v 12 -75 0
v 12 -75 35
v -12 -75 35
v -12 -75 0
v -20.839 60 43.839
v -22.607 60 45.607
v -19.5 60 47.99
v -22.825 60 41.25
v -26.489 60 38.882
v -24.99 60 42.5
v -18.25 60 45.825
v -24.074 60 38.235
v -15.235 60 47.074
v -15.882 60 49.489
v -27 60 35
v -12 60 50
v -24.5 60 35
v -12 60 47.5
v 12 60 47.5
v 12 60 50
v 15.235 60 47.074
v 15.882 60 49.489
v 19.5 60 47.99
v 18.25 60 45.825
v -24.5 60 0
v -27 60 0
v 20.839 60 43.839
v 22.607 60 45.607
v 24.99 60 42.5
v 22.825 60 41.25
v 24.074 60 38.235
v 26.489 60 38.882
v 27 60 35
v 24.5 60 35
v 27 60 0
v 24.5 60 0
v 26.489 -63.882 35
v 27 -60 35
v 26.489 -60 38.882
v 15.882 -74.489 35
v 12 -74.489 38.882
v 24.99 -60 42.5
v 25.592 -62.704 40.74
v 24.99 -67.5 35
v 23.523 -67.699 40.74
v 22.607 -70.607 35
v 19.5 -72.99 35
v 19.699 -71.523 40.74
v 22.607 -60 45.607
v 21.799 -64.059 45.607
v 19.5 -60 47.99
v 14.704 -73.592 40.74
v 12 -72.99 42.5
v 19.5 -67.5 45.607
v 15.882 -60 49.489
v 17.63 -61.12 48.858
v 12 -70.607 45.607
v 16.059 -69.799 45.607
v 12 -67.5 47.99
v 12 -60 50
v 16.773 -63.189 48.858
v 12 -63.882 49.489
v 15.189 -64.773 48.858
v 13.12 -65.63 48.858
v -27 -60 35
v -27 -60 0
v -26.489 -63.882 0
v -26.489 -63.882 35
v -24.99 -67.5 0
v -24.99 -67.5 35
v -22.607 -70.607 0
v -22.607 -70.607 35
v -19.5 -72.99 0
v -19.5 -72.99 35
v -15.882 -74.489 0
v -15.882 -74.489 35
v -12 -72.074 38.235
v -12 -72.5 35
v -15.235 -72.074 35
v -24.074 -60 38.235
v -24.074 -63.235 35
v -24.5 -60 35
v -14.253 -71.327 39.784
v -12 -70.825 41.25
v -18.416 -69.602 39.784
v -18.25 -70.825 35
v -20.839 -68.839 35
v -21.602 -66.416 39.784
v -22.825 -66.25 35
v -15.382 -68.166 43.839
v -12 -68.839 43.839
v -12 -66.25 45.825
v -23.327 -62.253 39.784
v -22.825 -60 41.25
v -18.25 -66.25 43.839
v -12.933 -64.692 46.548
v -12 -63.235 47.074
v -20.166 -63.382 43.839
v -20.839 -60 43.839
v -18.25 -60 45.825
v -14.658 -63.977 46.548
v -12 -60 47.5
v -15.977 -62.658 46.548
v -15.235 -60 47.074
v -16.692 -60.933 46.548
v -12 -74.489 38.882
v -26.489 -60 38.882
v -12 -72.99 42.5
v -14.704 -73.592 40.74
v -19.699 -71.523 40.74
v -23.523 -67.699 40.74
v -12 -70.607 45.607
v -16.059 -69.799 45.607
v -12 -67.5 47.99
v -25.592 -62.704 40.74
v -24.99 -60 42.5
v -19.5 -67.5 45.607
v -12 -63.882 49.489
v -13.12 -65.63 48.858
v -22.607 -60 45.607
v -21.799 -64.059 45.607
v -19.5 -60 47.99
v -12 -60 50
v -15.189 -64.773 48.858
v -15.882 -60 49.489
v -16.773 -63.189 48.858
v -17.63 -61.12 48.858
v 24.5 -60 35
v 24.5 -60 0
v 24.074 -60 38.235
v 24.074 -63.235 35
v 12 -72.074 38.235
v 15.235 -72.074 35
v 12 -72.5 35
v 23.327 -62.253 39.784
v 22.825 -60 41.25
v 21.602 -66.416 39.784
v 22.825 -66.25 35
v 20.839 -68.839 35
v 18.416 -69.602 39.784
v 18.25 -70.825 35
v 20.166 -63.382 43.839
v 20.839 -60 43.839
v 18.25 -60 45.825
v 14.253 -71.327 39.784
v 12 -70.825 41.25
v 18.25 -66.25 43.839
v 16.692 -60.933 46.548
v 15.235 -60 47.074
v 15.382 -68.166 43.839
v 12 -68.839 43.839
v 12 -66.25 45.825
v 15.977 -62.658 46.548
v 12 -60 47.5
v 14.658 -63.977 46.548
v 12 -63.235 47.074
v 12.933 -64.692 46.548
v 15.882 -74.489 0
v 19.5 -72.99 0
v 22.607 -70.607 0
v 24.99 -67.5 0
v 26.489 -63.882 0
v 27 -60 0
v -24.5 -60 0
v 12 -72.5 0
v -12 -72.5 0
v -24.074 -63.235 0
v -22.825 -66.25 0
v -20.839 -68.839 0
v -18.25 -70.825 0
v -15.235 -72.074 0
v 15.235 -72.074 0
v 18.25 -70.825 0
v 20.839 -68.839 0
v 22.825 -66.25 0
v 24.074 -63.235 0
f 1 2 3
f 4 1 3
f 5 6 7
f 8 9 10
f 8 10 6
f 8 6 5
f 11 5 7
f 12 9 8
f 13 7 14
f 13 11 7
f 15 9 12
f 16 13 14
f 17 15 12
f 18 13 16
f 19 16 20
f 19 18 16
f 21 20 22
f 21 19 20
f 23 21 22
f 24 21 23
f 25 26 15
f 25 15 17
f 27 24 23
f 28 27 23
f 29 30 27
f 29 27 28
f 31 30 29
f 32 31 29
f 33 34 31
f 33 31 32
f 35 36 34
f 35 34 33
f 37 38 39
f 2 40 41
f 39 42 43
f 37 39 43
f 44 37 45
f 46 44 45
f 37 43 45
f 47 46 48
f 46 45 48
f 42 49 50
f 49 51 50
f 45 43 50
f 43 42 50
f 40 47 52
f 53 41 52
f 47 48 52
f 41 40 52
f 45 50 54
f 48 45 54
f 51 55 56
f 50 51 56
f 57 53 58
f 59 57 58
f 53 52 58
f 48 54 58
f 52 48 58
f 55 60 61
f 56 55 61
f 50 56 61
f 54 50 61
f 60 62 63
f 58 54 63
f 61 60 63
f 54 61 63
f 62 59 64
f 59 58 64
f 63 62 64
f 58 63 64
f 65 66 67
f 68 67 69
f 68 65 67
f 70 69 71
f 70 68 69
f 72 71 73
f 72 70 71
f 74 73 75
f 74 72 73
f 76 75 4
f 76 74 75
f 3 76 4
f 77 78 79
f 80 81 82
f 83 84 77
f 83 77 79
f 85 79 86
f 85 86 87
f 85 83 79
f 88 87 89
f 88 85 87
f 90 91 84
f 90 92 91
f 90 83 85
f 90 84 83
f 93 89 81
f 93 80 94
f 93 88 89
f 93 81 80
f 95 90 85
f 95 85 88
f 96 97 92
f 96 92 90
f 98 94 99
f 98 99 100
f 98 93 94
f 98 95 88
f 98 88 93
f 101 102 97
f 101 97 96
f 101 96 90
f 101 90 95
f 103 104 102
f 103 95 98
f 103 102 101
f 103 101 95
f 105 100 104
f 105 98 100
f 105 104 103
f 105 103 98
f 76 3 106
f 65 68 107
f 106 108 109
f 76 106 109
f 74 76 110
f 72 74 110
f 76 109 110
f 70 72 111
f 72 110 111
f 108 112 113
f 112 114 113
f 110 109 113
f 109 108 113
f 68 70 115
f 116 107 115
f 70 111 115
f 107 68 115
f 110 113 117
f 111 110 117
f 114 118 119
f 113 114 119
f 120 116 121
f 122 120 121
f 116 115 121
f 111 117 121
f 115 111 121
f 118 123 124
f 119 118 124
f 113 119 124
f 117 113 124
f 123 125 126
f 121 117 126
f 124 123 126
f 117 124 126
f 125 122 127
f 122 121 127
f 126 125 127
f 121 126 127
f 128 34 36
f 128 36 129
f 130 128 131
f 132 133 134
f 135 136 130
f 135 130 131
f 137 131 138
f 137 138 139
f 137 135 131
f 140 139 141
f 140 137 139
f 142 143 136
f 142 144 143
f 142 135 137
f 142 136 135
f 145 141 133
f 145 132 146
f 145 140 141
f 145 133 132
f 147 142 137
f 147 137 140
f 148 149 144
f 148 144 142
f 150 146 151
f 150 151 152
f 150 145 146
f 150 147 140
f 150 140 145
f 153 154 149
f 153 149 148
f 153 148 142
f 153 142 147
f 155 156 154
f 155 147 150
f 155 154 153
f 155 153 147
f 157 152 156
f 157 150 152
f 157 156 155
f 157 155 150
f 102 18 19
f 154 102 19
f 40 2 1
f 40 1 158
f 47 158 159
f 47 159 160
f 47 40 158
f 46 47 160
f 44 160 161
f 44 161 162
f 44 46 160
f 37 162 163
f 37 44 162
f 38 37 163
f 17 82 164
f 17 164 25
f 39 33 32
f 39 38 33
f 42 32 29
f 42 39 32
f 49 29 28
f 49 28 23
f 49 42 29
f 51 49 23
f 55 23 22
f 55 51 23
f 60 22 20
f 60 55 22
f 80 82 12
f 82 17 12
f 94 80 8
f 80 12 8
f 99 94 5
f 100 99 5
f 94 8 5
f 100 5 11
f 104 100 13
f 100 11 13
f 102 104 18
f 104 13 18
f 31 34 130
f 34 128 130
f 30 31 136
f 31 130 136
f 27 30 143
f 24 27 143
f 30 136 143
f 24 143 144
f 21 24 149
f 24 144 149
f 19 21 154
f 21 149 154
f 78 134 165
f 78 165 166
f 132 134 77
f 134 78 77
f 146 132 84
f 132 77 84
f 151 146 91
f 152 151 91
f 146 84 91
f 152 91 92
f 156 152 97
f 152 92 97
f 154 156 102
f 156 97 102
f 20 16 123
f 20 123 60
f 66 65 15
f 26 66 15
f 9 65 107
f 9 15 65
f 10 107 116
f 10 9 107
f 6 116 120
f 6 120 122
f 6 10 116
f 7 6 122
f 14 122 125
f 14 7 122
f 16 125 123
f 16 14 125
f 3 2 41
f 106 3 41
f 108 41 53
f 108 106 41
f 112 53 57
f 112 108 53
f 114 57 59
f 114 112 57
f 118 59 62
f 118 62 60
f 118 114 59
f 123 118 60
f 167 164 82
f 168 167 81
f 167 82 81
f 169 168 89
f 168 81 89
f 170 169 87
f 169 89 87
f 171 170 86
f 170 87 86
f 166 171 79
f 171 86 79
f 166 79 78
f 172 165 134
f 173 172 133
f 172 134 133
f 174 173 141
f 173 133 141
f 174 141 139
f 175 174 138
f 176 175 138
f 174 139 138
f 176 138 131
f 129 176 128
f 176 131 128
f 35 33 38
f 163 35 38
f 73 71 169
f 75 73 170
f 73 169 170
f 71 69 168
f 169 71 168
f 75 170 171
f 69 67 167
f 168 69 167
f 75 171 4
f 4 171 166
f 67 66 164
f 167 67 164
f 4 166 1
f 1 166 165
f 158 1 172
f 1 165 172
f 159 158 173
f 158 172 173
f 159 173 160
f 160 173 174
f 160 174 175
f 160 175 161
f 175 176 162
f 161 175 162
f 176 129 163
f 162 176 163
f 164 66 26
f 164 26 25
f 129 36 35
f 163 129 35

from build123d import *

# Parameters (mm, degrees)
F0_W     = 54
F0_H     = 150
F1_DEPTH = 50
F2_R     = 15
F3_R     = 15
F5_DEPTH = 5
F6_W     = 121.107407
F6_H     = 220.926333
F7_DEPTH = 5.001
F8_W     = 141.400545
F8_H     = 89.871116
F9_DEPTH = 50.001
F10_T    = -2.5


with BuildPart() as f1:
    # F0 (on Top) → F1 (new body)
    with BuildSketch(Plane.XY):
        Rectangle(F0_W, F0_H)
    extrude(amount=F1_DEPTH)

    # F2
    f2_edges = [f1.edges().sort_by_distance(p)[0] for p in [
        (27, -75, 25),
        (-27, -75, 25),
        (27, 75, 25),
        (-27, 75, 25),
    ]]
    fillet(f2_edges, radius=F2_R)

    # F3
    f3_edges = [f1.edges().sort_by_distance(p)[0] for p in [
        (-27, 0, 50),
    ]]
    fillet(f3_edges, radius=F3_R)

    # F4 (on face) → F5 (join)
    with BuildSketch(Plane(origin=(0, 0, 0), x_dir=(1, 0, 0), z_dir=(0, 0, -1))):
        with BuildLine():
            ThreePointArc((12, -75), (22.606602, -70.606602), (27, -60))
            Line((27, -60), (27, 60))
            ThreePointArc((27, 60), (22.606602, 70.606602), (12, 75))
            Line((12, 75), (-12, 75))
            ThreePointArc((-12, 75), (-22.606602, 70.606602), (-27, 60))
            Line((-27, 60), (-27, -60))
            ThreePointArc((-27, -60), (-22.606602, -70.606602), (-12, -75))
            Line((-12, -75), (12, -75))
        make_face()
    extrude(amount=F5_DEPTH)

    # F6 (on Top) → F7 (cut, through all)
    with BuildSketch(Plane.XY):
        with Locations((-1.455303, 11.194787)):
            Rectangle(F6_W, F6_H)
    extrude(amount=-F7_DEPTH, mode=Mode.SUBTRACT)

    # F8 (on face) → F9 (cut, through all)
    with BuildSketch(Plane(origin=(0, 0, 0), x_dir=(1, 0, 0), z_dir=(0, 0, -1))):
        with Locations((8.066163, -104.935558)):
            Rectangle(F8_W, F8_H)
    extrude(amount=-F9_DEPTH, mode=Mode.SUBTRACT)

    # F10
    f10_openings = [f1.faces().sort_by_distance(p)[0] for p in [
        (0, -6.638802, 0),
        (0, 60, 24.196941),
    ]]
    offset(amount=F10_T, openings=f10_openings)


solid = f1.part
